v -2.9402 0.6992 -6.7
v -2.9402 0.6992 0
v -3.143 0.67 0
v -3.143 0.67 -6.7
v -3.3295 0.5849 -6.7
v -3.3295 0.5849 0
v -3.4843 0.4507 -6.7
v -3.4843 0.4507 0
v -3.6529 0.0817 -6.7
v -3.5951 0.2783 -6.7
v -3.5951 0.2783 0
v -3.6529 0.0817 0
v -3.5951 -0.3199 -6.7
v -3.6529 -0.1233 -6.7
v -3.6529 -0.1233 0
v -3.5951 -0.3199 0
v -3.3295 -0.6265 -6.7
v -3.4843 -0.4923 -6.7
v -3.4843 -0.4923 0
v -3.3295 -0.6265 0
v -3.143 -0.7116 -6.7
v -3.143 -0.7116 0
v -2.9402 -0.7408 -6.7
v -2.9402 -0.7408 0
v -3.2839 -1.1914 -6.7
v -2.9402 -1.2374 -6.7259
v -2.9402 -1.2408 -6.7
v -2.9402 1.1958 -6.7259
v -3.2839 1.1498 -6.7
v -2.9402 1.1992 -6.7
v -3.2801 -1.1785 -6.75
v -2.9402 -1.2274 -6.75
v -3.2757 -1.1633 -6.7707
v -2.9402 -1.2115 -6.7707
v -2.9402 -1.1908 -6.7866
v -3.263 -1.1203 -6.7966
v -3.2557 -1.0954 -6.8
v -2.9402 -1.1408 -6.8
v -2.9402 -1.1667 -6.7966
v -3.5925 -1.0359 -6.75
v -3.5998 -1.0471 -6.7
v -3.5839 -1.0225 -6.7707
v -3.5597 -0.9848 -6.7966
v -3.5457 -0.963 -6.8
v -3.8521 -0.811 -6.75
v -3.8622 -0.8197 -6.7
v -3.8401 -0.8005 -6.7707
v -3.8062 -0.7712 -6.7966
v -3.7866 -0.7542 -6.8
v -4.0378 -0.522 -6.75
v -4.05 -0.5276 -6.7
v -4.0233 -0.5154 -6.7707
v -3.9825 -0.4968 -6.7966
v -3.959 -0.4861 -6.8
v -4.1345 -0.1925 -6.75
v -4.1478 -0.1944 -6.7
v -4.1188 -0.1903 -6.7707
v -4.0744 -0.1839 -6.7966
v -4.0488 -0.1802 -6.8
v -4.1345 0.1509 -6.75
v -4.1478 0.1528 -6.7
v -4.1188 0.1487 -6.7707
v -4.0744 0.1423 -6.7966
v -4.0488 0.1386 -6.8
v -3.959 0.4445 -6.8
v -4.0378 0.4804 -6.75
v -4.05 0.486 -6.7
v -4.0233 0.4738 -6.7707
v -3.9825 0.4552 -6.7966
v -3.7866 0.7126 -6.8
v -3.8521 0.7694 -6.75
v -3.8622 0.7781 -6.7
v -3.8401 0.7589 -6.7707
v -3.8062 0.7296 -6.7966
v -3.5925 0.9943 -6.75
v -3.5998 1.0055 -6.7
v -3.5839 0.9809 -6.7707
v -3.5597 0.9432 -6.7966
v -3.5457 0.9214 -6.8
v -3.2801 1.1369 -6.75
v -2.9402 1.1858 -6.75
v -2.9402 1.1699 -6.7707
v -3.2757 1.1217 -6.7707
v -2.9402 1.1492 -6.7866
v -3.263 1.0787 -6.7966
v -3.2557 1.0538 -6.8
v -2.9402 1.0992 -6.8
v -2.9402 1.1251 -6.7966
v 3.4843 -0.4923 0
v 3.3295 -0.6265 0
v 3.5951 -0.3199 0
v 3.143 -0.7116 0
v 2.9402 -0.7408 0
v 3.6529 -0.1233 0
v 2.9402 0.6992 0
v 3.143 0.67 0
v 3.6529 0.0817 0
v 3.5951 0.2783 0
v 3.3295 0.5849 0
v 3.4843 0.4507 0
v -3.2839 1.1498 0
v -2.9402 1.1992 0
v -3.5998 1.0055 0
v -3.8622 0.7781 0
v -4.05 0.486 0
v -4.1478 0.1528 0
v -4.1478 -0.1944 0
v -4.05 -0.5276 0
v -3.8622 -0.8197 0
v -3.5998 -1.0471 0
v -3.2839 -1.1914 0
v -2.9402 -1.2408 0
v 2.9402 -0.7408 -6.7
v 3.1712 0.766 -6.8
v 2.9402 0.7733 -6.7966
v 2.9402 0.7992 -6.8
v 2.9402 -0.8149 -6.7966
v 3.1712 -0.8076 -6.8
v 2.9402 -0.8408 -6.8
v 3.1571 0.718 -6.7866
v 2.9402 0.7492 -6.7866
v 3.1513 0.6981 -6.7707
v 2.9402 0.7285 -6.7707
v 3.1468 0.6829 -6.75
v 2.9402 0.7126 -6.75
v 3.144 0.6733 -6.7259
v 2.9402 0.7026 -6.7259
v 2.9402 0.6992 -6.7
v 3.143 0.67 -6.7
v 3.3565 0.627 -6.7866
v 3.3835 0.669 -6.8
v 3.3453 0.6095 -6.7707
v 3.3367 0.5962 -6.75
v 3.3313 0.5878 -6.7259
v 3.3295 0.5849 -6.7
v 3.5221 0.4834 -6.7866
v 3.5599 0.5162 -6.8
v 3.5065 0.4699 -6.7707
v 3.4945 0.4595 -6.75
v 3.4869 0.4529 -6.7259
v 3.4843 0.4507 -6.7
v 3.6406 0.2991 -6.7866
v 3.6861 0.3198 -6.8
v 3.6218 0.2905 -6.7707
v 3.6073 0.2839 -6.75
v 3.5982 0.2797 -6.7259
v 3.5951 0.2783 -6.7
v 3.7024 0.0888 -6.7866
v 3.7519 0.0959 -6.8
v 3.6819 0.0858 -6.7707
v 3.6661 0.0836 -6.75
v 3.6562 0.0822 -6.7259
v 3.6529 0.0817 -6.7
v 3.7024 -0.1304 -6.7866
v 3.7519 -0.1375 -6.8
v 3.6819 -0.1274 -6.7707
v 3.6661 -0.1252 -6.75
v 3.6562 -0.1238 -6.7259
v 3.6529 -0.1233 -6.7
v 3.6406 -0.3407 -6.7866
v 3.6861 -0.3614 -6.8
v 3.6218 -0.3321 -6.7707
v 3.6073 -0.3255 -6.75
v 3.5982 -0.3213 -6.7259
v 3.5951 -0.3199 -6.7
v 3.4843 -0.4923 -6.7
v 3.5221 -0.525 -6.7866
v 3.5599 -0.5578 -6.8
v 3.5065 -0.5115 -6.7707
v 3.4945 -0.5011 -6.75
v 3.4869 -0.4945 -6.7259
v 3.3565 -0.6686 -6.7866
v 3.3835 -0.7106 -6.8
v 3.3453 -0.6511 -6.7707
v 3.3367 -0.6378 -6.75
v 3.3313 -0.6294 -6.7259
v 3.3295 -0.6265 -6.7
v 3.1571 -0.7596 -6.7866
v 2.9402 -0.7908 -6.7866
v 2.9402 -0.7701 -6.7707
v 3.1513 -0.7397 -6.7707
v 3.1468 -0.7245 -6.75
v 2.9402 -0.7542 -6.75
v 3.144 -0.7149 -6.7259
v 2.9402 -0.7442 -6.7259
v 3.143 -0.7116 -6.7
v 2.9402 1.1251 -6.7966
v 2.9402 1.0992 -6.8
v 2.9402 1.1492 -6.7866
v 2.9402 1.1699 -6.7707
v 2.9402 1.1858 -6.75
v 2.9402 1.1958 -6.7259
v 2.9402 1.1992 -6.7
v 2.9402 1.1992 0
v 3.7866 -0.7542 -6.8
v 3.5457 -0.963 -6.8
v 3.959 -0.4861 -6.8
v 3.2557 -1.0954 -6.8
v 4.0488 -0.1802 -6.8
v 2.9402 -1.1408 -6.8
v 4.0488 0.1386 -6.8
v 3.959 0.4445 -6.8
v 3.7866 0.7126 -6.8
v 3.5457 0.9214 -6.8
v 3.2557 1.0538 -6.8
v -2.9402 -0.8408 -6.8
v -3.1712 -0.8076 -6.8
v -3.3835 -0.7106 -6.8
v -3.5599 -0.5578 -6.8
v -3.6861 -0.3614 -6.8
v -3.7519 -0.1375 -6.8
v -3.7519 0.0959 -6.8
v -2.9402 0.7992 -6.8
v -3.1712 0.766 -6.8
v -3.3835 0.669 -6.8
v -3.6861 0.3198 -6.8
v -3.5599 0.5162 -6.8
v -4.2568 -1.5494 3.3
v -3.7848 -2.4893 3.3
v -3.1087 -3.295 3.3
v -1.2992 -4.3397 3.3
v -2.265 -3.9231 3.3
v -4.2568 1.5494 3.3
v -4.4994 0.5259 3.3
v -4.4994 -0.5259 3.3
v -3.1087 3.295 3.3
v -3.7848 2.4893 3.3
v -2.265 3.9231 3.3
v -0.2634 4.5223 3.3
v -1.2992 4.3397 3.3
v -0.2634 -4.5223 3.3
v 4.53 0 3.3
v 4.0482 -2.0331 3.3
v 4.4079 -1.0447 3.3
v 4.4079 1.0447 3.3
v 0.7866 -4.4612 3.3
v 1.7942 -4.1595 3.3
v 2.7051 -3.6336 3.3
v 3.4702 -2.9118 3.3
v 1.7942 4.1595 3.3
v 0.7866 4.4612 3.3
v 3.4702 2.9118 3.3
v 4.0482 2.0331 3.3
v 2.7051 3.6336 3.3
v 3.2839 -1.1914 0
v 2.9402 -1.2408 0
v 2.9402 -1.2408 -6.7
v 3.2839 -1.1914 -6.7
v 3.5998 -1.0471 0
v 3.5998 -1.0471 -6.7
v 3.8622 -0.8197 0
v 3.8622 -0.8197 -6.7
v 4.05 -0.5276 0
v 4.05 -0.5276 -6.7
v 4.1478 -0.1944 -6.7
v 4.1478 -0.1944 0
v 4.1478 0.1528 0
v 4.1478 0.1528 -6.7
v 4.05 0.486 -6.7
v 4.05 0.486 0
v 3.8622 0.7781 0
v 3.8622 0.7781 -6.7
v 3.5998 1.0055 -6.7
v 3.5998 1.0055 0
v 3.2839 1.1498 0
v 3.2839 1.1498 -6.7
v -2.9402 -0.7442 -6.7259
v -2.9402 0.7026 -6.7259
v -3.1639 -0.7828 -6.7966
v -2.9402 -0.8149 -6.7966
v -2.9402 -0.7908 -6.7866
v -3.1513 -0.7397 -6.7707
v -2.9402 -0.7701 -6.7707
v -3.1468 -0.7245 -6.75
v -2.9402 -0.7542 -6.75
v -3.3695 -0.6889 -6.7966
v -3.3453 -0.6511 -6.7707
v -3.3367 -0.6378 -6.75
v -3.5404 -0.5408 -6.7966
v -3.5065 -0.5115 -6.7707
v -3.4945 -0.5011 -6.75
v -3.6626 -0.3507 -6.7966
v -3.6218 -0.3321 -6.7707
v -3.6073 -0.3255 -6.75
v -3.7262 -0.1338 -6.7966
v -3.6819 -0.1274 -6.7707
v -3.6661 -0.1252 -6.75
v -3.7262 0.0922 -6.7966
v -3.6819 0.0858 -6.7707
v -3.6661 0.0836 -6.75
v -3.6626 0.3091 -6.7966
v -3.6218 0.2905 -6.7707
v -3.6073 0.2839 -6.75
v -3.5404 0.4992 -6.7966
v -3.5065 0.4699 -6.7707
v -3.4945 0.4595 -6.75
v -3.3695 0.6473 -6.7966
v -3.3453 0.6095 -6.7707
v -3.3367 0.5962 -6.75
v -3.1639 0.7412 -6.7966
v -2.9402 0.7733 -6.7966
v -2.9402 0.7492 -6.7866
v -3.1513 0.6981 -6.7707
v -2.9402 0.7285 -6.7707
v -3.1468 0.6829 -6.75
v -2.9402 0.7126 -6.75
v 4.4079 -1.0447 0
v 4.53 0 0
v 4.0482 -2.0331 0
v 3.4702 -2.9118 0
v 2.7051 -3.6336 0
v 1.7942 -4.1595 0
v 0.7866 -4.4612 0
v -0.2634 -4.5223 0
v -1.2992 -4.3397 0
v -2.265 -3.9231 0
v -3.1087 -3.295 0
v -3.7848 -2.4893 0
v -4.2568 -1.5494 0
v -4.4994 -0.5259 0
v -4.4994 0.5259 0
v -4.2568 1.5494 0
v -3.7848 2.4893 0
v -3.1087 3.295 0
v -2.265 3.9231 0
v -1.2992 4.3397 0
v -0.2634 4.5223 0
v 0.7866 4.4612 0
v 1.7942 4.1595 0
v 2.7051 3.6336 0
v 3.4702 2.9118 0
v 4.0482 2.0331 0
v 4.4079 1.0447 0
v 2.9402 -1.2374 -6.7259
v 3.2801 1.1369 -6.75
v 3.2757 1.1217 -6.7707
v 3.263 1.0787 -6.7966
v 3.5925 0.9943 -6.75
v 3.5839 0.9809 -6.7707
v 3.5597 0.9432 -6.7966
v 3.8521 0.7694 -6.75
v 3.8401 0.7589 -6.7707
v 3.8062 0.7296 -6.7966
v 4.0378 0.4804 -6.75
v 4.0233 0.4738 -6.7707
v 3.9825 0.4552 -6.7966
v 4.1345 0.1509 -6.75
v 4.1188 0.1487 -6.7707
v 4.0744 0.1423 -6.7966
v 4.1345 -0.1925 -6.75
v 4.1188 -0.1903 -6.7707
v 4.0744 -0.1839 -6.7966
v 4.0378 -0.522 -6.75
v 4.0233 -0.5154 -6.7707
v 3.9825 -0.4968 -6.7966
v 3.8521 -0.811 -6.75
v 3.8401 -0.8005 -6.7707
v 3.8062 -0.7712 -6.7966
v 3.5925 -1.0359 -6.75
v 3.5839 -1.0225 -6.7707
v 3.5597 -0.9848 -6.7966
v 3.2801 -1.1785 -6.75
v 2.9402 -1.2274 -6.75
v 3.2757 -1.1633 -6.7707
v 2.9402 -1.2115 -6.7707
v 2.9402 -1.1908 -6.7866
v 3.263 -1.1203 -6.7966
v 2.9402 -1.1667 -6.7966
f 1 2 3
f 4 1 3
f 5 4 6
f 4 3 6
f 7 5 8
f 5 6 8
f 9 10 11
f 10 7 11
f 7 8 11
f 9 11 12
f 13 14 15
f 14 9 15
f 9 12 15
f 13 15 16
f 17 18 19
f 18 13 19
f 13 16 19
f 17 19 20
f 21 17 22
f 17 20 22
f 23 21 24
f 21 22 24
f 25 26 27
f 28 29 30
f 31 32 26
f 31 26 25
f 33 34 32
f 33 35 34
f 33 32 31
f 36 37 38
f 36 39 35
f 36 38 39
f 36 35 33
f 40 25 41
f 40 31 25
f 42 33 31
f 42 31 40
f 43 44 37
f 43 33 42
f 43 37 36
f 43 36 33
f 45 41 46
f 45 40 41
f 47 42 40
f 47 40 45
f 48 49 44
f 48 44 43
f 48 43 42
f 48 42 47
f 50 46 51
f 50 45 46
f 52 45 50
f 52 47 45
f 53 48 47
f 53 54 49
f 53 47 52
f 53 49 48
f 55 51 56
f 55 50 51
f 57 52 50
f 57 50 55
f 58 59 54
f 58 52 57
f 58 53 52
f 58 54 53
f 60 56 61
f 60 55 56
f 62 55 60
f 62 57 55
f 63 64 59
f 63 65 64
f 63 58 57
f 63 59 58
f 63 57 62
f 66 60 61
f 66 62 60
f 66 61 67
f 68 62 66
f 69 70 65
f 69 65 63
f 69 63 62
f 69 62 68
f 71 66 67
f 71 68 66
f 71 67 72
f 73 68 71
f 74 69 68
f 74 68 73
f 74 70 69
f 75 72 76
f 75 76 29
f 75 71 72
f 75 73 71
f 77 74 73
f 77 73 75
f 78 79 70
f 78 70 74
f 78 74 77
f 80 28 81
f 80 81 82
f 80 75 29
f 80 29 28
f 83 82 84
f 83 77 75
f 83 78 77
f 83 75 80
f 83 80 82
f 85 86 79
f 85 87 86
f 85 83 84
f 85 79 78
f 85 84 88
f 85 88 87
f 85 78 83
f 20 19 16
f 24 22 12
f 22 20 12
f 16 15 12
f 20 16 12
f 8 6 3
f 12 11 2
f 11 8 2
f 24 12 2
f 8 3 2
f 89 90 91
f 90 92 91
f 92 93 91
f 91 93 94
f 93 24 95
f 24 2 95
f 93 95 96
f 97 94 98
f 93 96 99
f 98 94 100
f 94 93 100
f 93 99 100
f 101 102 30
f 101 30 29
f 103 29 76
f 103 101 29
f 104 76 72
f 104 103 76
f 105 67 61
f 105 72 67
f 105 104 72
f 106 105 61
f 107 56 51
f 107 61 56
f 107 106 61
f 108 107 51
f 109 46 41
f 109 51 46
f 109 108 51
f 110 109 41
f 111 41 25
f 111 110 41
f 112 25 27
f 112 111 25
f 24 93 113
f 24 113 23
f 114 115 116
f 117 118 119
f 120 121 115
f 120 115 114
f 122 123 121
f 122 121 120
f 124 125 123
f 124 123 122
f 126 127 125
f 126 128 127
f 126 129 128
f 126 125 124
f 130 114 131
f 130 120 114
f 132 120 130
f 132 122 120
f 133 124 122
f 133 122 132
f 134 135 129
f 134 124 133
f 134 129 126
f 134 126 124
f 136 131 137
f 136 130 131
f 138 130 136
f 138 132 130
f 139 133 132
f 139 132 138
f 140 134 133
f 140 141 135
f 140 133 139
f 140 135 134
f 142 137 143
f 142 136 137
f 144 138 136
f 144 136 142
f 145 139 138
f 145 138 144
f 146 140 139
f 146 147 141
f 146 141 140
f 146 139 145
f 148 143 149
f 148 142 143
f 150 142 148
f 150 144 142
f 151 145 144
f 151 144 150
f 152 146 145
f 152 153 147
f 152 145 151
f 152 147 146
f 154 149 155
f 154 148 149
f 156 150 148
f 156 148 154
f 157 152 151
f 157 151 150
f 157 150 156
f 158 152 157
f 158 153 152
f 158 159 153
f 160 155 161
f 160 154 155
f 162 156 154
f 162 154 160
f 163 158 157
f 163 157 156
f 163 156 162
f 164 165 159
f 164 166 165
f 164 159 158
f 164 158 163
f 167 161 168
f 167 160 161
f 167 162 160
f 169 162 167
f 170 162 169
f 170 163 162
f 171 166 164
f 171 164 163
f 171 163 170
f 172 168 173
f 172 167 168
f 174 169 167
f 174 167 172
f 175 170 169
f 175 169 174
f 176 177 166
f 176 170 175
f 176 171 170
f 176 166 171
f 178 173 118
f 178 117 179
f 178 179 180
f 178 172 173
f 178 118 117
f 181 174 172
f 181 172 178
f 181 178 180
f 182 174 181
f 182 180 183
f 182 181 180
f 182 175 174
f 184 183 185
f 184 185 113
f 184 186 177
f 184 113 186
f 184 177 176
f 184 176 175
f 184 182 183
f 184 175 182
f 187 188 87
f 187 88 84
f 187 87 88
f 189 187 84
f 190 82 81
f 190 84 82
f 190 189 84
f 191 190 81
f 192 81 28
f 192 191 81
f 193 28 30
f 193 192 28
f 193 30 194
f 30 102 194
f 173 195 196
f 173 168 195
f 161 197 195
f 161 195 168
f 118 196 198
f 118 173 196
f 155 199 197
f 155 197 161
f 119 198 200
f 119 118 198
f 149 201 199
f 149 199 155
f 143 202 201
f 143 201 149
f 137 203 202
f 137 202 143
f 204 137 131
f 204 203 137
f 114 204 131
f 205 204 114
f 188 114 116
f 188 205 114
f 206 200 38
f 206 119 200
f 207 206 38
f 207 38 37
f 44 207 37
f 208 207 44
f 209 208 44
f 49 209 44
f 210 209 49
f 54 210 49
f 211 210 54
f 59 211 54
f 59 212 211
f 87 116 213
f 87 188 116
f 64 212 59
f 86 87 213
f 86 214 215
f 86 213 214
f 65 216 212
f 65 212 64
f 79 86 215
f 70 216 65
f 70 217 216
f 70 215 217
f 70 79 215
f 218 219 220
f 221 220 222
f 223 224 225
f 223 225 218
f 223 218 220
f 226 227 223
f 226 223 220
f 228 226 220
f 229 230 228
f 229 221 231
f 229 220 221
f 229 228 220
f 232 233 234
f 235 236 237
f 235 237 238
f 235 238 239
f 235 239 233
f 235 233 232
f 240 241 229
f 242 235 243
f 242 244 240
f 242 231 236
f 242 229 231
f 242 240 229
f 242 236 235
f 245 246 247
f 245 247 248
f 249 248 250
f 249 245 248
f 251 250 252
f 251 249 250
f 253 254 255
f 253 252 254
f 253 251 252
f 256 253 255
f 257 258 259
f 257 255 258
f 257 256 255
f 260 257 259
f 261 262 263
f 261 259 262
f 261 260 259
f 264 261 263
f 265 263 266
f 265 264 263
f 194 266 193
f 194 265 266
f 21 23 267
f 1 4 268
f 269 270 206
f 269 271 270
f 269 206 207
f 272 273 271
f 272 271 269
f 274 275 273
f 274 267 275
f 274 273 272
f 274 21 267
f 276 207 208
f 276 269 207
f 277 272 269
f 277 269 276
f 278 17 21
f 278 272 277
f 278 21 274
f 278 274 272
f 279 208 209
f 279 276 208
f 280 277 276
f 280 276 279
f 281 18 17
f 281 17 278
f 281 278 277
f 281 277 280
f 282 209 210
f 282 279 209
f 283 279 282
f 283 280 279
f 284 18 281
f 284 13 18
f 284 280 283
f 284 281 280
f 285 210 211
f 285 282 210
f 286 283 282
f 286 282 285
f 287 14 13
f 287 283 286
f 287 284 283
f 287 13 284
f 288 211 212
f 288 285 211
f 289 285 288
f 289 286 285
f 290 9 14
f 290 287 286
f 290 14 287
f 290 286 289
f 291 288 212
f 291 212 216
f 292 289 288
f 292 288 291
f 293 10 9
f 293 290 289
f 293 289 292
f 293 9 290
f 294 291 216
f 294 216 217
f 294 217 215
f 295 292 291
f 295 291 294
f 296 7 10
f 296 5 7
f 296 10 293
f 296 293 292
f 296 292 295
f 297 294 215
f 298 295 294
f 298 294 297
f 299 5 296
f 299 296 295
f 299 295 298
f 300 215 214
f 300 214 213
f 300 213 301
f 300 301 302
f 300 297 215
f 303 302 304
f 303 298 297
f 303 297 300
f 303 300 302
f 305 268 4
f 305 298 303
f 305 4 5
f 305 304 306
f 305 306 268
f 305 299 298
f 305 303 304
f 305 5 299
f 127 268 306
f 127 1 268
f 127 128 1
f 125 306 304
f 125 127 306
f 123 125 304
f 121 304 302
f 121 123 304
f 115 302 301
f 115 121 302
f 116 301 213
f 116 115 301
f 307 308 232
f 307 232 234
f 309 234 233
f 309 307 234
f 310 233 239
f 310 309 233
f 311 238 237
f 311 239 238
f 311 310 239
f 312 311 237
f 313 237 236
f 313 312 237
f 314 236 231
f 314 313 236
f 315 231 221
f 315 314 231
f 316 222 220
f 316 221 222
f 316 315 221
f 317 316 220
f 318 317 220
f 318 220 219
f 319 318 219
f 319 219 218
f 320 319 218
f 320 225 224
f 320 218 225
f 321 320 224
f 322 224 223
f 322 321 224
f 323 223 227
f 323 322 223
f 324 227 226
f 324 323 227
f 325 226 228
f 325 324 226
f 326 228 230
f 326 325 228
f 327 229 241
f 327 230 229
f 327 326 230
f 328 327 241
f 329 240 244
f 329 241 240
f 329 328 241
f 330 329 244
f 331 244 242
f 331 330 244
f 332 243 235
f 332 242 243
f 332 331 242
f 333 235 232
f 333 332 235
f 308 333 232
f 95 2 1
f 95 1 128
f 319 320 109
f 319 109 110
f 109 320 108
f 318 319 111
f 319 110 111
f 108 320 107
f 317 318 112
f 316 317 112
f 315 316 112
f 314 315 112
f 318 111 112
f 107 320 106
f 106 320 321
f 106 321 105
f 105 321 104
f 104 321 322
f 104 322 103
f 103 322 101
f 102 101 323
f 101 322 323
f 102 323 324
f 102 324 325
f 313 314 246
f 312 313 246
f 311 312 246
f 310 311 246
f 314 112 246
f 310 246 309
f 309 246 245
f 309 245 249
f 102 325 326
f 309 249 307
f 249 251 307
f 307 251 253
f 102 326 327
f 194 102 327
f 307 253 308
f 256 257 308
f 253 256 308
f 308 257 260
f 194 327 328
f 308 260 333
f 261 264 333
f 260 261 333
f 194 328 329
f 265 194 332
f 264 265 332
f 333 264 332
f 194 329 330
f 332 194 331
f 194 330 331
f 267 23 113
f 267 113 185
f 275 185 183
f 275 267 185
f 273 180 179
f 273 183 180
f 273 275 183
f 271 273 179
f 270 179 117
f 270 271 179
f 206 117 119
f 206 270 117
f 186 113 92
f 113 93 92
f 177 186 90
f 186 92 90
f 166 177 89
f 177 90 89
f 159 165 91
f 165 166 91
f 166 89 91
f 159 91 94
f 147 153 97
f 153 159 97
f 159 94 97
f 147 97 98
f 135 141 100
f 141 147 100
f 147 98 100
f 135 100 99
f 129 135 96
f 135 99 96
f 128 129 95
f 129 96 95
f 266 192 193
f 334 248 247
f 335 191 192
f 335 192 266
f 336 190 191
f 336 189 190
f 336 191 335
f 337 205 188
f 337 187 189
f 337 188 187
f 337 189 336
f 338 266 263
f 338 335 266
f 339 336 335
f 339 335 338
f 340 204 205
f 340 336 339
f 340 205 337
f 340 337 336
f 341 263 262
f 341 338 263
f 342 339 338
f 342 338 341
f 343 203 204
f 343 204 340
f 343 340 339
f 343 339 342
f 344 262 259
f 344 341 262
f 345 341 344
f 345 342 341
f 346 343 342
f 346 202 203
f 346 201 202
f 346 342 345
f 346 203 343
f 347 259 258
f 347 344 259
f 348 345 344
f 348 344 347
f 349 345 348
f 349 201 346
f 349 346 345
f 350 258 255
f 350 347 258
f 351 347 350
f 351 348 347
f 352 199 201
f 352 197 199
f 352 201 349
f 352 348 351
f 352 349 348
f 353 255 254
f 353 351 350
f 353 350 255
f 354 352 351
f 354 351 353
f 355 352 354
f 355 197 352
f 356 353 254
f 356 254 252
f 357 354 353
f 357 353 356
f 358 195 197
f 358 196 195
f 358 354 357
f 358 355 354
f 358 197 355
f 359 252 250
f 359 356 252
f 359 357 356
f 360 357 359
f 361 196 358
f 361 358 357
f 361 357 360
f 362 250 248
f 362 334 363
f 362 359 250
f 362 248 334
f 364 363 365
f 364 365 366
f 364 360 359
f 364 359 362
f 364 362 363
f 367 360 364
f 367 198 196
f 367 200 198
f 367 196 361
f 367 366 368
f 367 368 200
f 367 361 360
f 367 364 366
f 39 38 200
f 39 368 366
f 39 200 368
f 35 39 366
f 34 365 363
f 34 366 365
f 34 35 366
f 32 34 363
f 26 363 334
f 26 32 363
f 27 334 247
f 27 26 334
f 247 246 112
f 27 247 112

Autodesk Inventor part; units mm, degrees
ref_plane "YZ Plane" through (0, 0, 0) normal (1, 0, 0) x (0, 1, 0)
ref_plane "XZ Plane" through (0, 0, 0) normal (0, 1, 0) x (-1, 0, 0)
ref_plane "XY Plane" through (0, 0, 0) normal (0, 0, 1) x (1, 0, 0)
sketch "草圖1" plane through (0, 0, 0) normal (0, 0, 1) x (1, 0, 0)
  circle A0 centre (0, 0) radius 4.53
  dimension "d0" = 9.06
extrude "擠出1" add sketch "草圖1" along normal blind 3.3
sketch "草圖2" plane through (0, 0, 0) normal (0, 0, -1) x (-1, 0, 0)
  line L0 (2.9402, 1.1992) -> (-2.9402, 1.1992)
  line L1 (-2.9402, -1.2408) -> (2.9402, -1.2408)
  arc A0 (-2.9402, 1.1992) -> (-2.9402, -1.2408) centre (-2.9402, -0.0208) ccw
  arc A1 (2.9402, -1.2408) -> (2.9402, 1.1992) centre (2.9402, -0.0208) ccw
  line L2 (-4.16, 0) -> (4.16, 0) construction
  arc A2 (2.9402, -0.7408) -> (2.9402, 0.6992) centre (2.9402, -0.0208) ccw
  line L3 (2.9402, 0.6992) -> (-2.9402, 0.6992)
  arc A3 (-2.9402, 0.6992) -> (-2.9402, -0.7408) centre (-2.9402, -0.0208) ccw
  line L4 (-2.9402, -0.7408) -> (2.9402, -0.7408)
  point P0 (0, 0)
  point P1 (0, 0)
  dimension "d3" = 8.32
  dimension "d5" = 2.44
  dimension "d6" = 0.5
extrude "擠出2" add sketch "草圖2" along normal blind 6.8
fillet "圓角1" radius 0.1 8 edges at (4.1602, -0.0208, -6.8) (0, -1.2408, -6.8) (-4.1602, -0.0208, -6.8) (0, 1.1992, -6.8) (-3.6602, -0.0208, -6.8) (0, -0.7408, -6.8) (3.6602, -0.0208, -6.8) (0, 0.6992, -6.8)
properties part number "磁吸頭"
